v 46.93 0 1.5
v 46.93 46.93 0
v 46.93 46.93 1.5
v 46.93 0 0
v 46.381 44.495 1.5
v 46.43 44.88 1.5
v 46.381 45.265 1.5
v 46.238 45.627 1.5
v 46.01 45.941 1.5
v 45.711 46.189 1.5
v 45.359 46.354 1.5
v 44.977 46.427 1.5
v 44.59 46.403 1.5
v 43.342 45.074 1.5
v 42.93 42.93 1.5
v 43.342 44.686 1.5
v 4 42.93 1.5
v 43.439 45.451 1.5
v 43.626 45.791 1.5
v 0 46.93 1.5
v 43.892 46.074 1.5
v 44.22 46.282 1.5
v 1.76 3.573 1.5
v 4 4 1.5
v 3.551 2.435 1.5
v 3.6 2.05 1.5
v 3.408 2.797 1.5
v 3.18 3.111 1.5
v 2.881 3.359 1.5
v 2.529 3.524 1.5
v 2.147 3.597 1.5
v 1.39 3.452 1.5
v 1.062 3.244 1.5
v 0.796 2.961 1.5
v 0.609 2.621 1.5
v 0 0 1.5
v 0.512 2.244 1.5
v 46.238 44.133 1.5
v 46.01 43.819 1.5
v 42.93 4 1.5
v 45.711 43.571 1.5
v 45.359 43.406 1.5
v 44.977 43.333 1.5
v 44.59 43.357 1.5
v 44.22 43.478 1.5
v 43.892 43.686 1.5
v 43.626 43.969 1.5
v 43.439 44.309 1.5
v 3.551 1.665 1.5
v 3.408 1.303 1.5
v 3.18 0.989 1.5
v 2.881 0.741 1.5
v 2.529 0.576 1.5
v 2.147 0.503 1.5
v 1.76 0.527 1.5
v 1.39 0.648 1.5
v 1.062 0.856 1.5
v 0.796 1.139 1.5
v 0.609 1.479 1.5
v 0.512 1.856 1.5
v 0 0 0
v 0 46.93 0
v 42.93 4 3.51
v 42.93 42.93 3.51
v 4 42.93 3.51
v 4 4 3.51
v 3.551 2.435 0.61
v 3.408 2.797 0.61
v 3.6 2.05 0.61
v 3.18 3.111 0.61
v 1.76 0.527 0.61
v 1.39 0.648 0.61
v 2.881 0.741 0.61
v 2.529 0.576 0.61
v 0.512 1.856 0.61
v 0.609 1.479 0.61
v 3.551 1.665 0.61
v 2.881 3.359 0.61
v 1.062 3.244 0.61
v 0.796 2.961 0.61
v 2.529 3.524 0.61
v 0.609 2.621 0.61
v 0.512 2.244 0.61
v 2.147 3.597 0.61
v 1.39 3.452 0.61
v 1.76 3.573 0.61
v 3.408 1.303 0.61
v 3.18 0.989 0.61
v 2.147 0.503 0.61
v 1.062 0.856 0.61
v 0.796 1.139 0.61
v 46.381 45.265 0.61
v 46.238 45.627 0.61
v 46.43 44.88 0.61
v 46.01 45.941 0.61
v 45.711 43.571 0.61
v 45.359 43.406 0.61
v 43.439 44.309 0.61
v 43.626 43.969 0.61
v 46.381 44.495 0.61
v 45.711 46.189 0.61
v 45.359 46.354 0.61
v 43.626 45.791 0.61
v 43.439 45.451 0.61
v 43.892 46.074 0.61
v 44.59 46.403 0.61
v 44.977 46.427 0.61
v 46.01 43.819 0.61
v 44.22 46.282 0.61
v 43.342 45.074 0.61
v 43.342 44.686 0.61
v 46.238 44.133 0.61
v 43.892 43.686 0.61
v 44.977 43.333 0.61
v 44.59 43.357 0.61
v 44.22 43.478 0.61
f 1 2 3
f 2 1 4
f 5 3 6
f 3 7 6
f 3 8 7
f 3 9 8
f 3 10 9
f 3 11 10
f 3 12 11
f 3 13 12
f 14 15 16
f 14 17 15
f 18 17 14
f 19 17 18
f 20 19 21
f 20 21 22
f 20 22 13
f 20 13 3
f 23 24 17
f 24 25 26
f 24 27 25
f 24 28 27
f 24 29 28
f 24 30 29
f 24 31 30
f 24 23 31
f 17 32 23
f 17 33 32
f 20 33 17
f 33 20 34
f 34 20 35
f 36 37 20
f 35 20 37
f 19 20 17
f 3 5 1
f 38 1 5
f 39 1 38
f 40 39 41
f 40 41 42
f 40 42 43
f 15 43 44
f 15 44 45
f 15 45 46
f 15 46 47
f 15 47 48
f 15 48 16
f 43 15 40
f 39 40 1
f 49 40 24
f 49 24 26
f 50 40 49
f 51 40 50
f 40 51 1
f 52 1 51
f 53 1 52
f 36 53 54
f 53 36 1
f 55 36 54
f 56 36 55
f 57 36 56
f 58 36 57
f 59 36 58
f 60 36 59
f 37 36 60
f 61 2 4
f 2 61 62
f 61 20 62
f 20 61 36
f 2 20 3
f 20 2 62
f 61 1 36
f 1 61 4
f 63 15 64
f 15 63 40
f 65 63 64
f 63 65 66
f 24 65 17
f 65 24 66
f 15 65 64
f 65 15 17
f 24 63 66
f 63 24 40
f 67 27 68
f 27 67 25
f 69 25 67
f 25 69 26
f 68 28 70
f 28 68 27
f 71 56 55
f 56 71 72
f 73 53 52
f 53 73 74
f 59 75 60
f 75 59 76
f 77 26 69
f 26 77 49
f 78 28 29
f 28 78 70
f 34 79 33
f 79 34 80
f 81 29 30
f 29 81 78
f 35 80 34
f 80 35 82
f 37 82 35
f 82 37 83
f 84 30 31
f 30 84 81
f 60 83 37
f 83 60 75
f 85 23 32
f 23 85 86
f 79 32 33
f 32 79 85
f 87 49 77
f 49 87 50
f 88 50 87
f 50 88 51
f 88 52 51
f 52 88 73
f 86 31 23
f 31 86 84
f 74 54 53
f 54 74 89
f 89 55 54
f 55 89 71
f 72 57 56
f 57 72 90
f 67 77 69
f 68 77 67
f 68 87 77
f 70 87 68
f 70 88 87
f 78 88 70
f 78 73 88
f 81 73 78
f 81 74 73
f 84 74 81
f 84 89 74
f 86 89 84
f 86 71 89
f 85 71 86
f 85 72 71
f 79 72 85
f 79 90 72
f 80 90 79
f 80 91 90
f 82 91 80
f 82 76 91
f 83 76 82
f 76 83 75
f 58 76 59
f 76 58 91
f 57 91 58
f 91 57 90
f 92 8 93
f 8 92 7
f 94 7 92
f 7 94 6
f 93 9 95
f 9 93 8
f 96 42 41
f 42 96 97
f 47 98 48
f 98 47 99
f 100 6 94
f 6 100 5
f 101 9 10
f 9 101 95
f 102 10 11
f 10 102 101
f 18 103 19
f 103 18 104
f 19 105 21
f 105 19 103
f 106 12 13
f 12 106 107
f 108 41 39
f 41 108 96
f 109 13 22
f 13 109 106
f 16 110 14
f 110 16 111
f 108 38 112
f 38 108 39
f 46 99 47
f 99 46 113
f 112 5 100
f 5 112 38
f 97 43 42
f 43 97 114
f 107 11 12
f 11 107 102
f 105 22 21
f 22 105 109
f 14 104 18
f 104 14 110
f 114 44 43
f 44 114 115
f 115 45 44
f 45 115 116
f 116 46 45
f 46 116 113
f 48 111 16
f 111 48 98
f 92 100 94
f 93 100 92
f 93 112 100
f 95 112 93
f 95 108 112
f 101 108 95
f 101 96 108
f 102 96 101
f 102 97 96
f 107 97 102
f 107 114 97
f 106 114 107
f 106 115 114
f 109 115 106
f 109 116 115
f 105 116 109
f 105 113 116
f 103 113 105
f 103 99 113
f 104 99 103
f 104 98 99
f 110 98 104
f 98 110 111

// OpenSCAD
// Dice measures: 12.3mm x 12.3mm x 12.3mm
$fa = 1;
$fs = 0.4;

hole_with = 12.31*3;
hole_lenght = 12.31*3;
hole_hight = 12.31*2;

magnet_radius = 1.55;
magnet_lenght = 1;

difference() {
    union() {
        cube([hole_with + 10, hole_lenght + 10, 1.5]);

        translate([4, 4, 1.5])
            cube([hole_with + 2, hole_lenght + 2, 2.01]);
    }

    // Maget Holes
    translate([magnet_radius + 0.5, magnet_radius + 0.5, 1.5-0.89])
        cylinder(r=magnet_radius, h=magnet_lenght);

    translate([hole_with + 10 - magnet_radius - 0.5, hole_with + 10 - magnet_radius - 0.5, 1.5 - 0.89])
        cylinder(r=magnet_radius, h=magnet_lenght);
}
